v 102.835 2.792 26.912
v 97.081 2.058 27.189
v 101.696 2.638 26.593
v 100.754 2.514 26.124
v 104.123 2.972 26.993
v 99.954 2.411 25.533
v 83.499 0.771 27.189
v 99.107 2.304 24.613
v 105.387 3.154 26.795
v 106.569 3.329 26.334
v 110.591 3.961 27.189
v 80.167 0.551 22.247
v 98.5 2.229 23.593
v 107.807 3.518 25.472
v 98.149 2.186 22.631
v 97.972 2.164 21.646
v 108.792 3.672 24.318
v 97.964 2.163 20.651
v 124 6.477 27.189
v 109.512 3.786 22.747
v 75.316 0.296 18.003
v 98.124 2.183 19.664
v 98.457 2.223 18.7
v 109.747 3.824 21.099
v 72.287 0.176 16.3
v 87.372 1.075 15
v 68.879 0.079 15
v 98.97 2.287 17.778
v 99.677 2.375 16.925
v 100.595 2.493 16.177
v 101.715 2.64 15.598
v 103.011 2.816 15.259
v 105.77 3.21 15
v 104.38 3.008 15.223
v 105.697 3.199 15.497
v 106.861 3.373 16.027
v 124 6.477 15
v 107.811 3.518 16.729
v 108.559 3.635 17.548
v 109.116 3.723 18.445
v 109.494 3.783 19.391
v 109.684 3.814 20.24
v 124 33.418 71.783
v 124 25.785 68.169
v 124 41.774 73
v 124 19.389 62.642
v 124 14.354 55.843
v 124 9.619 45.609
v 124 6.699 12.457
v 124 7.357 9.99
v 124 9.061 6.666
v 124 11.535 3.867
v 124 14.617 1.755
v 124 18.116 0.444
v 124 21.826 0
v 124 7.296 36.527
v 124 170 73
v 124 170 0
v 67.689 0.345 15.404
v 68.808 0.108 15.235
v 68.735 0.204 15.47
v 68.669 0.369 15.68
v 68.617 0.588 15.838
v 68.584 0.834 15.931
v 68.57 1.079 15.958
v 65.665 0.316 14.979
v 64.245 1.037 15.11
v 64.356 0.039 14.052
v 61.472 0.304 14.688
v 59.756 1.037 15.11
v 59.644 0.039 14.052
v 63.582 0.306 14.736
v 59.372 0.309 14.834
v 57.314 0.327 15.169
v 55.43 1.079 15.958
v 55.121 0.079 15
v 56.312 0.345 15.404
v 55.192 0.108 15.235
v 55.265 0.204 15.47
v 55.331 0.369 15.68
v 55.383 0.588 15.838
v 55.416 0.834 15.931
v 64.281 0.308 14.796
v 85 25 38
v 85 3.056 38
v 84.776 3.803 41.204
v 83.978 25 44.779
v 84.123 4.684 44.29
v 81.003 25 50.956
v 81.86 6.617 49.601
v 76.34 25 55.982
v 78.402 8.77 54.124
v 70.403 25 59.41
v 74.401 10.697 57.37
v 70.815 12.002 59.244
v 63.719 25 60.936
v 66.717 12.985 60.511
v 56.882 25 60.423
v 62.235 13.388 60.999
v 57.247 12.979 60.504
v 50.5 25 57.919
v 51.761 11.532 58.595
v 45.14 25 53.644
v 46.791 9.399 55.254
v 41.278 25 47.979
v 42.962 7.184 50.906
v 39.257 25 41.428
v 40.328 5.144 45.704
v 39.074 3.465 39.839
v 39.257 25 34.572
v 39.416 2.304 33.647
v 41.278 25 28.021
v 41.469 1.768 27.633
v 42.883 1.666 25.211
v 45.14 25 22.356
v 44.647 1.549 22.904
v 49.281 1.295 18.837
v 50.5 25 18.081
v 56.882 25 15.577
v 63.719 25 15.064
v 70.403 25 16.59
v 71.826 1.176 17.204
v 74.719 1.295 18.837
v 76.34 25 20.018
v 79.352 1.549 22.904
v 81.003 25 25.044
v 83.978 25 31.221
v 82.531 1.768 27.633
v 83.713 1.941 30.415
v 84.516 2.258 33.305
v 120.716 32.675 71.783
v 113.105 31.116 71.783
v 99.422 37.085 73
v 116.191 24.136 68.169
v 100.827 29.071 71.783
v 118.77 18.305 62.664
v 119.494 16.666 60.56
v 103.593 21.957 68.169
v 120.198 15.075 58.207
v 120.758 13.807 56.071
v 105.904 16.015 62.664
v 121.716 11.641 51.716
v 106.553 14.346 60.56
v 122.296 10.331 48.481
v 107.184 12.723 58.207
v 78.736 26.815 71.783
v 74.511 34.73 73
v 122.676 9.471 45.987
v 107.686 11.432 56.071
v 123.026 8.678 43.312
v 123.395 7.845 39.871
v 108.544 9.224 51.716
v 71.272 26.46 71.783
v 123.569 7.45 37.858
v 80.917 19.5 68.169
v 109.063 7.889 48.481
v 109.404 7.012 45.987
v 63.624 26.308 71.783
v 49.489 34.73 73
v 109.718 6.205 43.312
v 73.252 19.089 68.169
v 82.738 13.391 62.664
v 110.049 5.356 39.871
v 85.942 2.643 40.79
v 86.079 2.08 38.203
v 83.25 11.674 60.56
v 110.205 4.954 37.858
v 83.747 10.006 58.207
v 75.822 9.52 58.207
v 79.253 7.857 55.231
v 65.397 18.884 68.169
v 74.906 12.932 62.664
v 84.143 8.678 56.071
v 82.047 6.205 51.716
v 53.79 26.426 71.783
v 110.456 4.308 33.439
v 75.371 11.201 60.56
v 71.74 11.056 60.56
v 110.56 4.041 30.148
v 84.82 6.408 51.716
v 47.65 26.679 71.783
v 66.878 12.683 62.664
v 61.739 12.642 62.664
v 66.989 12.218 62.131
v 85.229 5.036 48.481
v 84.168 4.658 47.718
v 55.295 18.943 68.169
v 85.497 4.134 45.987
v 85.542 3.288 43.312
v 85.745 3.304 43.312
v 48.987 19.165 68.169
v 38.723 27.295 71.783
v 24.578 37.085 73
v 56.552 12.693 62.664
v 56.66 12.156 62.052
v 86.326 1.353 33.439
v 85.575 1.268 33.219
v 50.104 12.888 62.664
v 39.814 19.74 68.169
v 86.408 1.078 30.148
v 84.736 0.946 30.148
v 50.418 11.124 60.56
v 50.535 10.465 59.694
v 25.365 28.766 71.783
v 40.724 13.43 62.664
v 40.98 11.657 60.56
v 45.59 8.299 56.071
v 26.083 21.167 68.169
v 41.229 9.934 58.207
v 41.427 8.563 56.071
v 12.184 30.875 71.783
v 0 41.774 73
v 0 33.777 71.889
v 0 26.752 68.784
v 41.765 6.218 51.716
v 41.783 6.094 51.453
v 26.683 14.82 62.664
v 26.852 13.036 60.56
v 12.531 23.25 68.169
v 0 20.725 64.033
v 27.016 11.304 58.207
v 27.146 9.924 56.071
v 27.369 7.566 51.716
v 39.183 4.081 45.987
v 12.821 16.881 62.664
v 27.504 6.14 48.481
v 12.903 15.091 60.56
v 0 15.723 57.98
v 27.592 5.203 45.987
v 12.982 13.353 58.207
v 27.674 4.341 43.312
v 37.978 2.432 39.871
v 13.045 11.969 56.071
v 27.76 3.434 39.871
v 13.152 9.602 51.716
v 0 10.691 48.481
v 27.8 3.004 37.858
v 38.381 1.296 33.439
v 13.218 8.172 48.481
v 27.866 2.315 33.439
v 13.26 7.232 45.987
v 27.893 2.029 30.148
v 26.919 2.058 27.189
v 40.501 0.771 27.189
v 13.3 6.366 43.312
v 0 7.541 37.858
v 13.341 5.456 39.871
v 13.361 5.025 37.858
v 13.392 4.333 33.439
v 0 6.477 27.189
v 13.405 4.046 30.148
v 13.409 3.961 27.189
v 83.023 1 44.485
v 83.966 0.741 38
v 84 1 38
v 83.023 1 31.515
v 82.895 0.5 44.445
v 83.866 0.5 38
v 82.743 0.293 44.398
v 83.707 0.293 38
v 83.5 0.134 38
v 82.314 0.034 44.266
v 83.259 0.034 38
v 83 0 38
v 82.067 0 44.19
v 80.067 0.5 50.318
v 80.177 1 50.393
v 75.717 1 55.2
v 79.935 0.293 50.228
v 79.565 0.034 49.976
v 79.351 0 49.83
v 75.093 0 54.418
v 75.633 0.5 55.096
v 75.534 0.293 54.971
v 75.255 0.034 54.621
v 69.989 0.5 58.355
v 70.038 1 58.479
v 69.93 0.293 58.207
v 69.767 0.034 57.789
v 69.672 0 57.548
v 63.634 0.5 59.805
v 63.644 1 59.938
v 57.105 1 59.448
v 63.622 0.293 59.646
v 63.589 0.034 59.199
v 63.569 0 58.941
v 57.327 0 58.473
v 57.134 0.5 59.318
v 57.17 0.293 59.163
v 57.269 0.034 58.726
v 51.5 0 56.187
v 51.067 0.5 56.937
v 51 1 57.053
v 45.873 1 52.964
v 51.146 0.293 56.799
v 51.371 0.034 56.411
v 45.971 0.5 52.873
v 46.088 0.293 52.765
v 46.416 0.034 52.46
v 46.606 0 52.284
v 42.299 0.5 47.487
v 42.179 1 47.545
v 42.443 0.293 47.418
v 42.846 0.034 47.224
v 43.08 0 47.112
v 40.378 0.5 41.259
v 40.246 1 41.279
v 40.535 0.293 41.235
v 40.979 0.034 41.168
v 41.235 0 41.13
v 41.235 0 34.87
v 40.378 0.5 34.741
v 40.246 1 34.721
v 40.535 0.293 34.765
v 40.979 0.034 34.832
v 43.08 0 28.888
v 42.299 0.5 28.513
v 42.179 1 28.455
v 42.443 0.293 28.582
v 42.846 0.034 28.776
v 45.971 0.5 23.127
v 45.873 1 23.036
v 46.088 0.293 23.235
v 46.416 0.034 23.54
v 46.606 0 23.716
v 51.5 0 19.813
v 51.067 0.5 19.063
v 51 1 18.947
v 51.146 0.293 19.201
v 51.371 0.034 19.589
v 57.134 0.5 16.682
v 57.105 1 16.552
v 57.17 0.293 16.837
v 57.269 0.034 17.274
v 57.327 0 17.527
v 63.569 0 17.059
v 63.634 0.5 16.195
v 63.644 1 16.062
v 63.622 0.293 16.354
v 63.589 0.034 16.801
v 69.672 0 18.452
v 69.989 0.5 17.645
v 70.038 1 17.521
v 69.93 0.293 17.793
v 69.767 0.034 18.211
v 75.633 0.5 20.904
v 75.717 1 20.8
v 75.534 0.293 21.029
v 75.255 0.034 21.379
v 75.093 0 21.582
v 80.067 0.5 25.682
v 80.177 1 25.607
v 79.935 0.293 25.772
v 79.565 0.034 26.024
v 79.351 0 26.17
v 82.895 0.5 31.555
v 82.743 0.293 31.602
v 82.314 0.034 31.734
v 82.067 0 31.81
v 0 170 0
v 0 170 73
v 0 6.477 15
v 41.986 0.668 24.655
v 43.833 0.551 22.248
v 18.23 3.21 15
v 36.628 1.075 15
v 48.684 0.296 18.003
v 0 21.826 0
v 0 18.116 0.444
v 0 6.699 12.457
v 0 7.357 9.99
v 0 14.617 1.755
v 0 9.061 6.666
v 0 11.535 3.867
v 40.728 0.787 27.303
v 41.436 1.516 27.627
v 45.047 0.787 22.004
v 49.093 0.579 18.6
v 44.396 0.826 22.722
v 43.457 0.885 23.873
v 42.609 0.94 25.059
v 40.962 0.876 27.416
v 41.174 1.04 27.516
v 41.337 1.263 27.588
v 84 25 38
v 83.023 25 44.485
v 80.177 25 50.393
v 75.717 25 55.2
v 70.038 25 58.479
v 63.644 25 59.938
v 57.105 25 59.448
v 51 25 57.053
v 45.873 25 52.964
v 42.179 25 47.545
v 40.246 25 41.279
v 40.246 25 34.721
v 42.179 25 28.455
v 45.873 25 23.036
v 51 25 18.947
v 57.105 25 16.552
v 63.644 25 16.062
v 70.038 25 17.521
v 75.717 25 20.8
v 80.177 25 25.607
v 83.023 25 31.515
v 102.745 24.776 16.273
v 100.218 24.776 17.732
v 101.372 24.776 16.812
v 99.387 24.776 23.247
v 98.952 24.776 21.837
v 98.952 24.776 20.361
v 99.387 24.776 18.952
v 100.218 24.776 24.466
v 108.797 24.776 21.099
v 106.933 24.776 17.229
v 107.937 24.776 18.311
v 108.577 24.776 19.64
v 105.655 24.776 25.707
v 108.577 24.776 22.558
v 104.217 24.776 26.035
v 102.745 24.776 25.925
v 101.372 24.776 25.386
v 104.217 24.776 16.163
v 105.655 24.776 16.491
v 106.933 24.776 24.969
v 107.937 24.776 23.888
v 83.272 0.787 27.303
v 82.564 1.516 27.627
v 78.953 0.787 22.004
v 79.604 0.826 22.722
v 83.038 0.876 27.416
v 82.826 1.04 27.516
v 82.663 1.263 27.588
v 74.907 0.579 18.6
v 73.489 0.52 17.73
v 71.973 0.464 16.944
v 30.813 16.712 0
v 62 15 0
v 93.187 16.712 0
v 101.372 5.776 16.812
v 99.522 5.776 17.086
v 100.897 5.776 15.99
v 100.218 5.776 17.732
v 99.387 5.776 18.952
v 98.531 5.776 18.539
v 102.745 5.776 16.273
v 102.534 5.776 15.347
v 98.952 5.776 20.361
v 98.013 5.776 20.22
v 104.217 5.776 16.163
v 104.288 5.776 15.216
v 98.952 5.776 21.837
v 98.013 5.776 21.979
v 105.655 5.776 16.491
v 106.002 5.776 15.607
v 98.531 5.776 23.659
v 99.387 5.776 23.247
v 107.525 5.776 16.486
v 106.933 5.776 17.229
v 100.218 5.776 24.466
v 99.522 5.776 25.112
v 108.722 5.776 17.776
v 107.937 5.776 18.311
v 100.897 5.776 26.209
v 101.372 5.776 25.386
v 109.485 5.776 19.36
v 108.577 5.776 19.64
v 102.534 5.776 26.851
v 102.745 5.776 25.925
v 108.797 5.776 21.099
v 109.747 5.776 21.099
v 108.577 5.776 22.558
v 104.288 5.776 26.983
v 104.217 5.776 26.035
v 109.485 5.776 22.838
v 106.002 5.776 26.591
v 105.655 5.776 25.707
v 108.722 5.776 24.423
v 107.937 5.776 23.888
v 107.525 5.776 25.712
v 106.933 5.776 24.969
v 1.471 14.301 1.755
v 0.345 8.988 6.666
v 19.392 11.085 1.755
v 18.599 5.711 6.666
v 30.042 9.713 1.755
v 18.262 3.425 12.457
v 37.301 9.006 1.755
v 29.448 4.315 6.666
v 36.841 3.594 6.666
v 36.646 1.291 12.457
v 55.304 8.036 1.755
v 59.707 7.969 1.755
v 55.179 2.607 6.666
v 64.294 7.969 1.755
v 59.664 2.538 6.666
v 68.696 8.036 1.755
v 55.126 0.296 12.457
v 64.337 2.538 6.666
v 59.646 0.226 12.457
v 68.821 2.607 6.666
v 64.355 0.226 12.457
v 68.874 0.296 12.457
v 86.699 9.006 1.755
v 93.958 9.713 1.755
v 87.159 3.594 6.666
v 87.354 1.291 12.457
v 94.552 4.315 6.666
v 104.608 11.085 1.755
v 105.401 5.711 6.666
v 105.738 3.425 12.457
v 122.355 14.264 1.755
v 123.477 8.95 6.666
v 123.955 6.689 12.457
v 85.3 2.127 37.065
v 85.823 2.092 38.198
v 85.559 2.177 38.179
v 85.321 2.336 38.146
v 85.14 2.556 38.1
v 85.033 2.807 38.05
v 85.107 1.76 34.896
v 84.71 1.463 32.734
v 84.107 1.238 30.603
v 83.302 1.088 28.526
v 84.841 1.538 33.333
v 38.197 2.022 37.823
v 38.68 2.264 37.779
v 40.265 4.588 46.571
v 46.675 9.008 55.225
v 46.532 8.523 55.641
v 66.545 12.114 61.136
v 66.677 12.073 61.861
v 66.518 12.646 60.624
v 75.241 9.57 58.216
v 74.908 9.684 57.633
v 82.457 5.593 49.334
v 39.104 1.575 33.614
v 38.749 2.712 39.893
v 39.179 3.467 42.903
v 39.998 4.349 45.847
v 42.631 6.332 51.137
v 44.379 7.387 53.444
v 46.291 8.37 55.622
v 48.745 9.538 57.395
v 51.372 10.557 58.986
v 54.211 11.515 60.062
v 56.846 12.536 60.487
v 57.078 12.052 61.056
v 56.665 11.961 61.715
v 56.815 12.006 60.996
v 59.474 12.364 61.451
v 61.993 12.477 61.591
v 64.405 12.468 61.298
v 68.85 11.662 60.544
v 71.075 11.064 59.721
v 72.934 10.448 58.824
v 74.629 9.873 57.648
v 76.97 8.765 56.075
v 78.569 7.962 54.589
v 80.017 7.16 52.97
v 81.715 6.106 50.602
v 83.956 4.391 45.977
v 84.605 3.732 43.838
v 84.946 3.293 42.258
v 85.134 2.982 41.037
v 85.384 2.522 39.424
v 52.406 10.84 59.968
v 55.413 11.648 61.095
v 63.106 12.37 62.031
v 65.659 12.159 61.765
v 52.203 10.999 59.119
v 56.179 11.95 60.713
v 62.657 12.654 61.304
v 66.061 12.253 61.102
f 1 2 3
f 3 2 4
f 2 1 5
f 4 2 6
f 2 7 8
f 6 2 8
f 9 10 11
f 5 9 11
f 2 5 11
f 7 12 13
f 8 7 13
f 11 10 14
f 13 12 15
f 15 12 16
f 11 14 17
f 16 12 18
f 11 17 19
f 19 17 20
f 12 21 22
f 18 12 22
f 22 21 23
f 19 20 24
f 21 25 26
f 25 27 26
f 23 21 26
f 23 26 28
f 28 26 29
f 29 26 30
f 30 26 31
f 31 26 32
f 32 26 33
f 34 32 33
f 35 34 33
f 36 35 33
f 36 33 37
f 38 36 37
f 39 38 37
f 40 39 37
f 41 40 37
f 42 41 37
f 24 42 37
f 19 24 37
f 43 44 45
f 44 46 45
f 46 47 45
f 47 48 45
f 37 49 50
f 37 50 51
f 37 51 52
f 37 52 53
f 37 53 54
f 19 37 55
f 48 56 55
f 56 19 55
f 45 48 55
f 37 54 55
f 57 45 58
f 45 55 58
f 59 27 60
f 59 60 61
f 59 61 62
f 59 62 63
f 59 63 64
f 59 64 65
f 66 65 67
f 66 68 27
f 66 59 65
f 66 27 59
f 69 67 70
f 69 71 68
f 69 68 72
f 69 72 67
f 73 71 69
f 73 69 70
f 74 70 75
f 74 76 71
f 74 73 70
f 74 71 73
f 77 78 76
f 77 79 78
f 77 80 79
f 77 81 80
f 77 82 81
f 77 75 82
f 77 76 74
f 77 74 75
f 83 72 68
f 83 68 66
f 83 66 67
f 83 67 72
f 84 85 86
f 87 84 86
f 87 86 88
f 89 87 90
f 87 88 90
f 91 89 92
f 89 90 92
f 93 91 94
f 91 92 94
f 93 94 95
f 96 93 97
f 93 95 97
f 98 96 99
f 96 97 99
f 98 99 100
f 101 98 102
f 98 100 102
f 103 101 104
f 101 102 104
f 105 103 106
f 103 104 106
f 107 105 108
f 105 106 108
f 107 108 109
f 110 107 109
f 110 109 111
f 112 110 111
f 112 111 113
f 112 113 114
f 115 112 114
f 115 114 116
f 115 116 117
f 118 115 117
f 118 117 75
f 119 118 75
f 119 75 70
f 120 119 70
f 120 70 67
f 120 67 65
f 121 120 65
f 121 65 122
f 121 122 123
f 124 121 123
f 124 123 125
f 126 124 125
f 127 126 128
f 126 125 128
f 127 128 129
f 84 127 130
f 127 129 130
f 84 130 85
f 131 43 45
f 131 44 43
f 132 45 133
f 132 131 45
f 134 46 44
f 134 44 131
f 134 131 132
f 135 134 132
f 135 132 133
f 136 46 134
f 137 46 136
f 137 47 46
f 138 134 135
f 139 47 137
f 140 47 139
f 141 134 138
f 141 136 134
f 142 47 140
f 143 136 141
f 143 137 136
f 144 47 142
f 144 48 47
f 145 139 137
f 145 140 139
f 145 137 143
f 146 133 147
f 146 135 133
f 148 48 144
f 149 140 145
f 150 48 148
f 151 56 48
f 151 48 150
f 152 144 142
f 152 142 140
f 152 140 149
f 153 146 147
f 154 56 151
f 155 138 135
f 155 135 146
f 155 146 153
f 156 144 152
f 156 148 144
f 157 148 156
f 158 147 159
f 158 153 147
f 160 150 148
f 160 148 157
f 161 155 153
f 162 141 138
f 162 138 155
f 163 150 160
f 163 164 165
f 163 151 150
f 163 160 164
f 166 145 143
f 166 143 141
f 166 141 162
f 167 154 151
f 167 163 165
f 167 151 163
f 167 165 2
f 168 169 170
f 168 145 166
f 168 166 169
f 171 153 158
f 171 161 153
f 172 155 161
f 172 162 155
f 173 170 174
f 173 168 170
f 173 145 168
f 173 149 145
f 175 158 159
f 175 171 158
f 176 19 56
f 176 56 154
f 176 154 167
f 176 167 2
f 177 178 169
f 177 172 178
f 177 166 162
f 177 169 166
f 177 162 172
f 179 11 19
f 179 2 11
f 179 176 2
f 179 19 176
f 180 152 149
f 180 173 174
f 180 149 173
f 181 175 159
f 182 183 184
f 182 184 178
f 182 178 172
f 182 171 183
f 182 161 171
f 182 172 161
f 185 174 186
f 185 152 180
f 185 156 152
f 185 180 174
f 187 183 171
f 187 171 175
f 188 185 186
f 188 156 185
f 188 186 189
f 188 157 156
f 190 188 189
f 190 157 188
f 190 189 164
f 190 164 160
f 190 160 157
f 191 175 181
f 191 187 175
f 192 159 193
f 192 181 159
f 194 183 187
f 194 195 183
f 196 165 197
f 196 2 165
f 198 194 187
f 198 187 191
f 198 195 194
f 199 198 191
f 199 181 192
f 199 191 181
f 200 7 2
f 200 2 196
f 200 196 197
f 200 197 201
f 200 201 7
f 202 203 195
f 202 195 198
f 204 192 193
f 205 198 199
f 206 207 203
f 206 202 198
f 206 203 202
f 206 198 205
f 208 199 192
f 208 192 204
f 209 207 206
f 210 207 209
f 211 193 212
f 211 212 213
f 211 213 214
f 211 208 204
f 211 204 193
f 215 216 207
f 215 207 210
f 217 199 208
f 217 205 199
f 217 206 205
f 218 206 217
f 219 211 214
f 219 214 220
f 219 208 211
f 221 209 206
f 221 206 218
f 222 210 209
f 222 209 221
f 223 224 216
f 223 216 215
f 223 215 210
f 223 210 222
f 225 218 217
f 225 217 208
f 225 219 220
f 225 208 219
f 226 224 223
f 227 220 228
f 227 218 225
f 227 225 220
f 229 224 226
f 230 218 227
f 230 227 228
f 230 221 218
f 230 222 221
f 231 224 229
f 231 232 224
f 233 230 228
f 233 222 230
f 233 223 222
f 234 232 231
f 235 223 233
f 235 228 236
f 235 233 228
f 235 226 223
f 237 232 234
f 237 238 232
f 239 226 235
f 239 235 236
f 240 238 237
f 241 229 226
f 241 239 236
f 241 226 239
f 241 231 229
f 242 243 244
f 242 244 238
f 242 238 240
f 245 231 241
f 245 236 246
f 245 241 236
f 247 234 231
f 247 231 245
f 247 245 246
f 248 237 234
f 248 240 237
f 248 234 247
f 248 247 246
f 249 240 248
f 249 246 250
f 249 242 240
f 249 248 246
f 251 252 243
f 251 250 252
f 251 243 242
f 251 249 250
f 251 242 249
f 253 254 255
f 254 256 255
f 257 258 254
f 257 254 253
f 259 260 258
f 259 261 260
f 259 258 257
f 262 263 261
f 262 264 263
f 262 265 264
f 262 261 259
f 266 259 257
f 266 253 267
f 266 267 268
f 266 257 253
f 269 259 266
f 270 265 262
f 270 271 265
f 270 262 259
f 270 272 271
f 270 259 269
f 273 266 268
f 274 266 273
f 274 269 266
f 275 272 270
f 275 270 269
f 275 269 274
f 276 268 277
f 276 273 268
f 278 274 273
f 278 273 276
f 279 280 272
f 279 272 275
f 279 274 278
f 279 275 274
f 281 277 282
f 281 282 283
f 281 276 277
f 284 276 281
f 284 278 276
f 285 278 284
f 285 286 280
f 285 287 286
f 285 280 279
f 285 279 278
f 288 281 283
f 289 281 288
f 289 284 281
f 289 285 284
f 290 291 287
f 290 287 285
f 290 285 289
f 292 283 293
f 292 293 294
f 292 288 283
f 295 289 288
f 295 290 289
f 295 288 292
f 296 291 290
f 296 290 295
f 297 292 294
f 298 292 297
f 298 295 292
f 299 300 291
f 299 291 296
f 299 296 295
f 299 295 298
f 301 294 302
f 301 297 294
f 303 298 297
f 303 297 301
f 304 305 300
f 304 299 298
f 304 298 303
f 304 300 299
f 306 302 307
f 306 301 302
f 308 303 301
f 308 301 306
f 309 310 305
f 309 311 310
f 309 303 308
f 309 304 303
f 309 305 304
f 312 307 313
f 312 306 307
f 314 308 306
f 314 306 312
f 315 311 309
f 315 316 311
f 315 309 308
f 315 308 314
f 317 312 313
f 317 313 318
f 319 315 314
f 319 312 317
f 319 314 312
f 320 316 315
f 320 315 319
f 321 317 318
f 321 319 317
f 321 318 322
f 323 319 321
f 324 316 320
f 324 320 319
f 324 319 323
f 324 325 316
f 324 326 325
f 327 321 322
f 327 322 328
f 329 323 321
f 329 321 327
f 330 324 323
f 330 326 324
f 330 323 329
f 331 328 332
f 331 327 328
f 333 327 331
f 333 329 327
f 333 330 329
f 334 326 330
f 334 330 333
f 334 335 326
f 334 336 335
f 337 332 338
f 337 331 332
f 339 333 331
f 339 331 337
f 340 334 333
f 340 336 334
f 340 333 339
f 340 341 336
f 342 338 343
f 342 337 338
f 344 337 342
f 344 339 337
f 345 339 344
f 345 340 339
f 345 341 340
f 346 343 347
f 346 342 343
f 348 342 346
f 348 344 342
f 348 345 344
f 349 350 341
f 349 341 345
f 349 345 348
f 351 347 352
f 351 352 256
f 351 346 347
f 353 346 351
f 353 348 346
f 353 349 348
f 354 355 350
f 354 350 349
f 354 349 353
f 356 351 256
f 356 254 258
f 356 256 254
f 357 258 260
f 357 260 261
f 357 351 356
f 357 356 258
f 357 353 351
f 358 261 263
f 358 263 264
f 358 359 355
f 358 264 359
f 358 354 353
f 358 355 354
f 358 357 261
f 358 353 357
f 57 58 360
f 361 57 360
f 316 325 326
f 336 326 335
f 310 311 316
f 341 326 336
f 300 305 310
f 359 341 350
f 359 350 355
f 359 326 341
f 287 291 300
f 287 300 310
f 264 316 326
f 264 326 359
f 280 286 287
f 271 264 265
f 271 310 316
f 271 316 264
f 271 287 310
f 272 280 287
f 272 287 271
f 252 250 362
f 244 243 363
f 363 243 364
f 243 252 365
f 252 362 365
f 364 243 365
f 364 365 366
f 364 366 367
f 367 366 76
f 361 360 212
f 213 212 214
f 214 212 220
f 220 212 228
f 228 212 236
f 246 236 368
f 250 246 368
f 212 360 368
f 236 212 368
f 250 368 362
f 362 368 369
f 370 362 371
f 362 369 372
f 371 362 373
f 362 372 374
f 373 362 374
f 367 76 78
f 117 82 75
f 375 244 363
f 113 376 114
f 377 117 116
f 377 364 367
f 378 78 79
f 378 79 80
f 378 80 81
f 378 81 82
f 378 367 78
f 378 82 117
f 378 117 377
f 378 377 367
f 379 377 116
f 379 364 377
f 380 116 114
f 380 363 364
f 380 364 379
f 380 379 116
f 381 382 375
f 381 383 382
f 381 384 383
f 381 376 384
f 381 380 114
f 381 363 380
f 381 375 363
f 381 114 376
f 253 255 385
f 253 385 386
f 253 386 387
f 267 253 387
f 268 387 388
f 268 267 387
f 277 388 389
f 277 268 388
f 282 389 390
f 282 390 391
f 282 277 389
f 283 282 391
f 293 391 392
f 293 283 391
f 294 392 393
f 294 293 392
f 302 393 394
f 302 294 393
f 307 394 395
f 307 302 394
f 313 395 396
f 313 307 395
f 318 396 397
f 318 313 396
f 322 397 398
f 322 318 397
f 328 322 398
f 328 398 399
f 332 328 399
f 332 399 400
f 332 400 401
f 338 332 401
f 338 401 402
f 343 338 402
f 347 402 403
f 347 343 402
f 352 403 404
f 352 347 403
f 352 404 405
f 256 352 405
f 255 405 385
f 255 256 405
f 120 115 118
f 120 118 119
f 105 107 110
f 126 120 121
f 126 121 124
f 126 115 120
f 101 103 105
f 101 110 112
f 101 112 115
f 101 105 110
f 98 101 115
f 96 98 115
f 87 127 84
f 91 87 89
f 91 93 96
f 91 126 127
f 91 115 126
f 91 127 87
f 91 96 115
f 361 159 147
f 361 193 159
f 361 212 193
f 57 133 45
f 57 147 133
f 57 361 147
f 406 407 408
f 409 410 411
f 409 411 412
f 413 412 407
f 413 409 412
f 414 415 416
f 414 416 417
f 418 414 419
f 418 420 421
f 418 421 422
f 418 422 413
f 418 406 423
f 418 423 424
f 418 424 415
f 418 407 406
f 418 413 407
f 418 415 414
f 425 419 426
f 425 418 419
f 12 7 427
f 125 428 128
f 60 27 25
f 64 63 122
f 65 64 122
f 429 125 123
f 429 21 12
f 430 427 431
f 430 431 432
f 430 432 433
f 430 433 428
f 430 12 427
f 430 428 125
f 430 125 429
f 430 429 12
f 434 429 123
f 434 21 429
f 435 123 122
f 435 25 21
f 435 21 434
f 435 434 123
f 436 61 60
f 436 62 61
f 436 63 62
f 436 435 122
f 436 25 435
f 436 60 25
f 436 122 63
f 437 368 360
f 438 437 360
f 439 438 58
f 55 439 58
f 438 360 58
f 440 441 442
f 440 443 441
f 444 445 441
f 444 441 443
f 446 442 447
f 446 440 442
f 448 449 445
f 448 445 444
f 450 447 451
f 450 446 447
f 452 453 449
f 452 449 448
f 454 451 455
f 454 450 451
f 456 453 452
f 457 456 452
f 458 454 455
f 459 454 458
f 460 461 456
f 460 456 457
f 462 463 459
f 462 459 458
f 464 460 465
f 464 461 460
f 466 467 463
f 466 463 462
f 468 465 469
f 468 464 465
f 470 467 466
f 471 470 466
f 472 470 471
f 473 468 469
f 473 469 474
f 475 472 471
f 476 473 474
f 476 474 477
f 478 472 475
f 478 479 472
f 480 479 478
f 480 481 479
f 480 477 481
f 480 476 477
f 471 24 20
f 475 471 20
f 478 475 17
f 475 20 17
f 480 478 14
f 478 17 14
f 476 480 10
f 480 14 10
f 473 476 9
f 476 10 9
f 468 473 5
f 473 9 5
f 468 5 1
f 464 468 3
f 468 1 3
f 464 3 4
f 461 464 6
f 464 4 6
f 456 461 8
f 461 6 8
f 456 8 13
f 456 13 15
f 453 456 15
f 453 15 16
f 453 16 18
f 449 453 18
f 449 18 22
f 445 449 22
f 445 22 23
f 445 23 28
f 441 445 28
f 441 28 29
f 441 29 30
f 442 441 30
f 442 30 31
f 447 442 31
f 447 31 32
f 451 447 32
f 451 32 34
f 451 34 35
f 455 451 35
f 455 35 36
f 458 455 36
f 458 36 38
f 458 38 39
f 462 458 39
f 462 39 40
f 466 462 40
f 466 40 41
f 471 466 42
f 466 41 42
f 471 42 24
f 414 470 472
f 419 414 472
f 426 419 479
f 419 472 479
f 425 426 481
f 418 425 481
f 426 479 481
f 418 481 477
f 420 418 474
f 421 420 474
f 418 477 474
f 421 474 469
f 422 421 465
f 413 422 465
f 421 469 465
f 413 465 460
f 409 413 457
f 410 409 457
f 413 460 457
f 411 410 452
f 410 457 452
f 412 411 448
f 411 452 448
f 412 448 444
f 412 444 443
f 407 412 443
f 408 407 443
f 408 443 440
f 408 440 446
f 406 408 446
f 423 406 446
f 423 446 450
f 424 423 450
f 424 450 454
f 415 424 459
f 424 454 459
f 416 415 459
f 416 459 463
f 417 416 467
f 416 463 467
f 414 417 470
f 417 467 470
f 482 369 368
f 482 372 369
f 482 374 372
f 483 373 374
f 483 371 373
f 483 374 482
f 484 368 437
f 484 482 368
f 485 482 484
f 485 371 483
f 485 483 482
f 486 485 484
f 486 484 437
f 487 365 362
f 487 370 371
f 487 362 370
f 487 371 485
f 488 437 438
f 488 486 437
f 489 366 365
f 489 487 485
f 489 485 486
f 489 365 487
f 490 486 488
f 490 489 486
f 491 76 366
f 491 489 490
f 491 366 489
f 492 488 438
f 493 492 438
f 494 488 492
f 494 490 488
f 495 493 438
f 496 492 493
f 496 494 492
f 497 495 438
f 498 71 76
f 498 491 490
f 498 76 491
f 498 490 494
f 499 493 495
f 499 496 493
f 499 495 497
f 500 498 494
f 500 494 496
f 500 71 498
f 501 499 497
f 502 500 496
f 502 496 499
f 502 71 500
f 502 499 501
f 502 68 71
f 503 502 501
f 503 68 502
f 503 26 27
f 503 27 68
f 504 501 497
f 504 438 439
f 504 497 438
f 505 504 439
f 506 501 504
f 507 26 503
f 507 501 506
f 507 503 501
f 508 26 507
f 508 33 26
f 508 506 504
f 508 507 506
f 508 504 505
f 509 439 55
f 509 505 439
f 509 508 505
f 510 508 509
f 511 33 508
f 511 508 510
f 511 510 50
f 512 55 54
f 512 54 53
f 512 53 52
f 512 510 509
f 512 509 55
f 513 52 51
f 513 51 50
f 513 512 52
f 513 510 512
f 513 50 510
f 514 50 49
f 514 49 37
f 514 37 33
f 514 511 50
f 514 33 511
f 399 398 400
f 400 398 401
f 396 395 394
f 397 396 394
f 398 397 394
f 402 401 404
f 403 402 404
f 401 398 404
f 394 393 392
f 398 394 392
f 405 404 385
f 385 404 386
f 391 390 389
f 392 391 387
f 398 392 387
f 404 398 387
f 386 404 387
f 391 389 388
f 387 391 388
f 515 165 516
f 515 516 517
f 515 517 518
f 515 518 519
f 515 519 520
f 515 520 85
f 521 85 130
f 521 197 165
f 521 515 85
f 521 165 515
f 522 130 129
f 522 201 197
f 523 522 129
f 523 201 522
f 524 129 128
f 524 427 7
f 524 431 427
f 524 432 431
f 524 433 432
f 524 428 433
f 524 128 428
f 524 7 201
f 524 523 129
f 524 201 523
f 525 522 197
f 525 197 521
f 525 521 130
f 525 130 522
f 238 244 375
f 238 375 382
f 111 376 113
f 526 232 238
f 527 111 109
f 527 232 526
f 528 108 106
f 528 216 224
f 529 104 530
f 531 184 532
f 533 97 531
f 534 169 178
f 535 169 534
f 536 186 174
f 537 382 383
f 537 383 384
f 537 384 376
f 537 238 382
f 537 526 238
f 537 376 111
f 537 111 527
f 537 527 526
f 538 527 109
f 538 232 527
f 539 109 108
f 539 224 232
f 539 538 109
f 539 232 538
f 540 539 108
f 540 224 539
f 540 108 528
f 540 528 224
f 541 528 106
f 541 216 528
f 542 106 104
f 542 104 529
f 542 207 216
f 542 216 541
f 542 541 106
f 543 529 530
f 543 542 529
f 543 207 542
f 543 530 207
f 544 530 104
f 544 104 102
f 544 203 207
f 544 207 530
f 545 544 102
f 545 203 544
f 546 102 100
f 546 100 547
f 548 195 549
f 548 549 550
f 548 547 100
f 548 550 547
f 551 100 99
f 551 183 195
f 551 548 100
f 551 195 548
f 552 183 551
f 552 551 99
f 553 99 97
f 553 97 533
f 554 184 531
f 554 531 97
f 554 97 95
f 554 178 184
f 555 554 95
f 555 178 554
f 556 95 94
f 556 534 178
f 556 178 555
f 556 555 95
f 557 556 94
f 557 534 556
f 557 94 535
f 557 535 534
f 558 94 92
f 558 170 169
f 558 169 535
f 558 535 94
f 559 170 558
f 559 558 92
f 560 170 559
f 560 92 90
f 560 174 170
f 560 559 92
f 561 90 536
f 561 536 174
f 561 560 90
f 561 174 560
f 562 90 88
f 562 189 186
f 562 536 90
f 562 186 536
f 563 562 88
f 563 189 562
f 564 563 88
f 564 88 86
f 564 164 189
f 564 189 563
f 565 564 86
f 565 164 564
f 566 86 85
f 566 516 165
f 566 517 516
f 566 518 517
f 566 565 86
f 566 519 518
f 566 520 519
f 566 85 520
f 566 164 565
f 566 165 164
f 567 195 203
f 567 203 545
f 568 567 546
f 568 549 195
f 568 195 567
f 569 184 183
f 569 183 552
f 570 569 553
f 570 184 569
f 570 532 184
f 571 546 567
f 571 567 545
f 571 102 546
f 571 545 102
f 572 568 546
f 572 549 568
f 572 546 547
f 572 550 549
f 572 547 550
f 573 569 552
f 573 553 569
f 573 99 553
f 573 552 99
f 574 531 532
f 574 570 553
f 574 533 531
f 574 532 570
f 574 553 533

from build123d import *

# Parameters (mm, degrees)
F1_DEPTH  = 73
F4_R      = 15
F5_R      = 23
F6_DEPTH  = 25
F7_R      = 1
F8_R      = 22
F9_DEPTH  = 25
F10_R     = 1
F11_R     = 5.9
F12_DEPTH = 5.776
F13_R     = 4.95
F14_DEPTH = 19


with BuildPart() as f1:
    # F0 (on Top) → F1 (new body)
    with BuildSketch(Plane.XY):
        with BuildLine():
            Line((124, 170), (0, 170))
            Line((0, 170), (0, 6.4765767439))
            ThreePointArc((0, 6.4765767439), (62, 0), (124, 6.4765767439))
            Line((124, 6.4765767439), (124, 170))
        make_face()
    extrude(amount=F1_DEPTH)

    # F2 (on face) → F3 (revolve, cut)
    with BuildSketch(Plane(origin=(0, 0, 0), x_dir=(0, -1, 0), z_dir=(-1, 0, 0))):
        with BuildLine():
            Line((4.2734915467, 0), (4.2734915467, 73))
            Line((4.2734915467, 73), (-41.7740754783, 73))
            add(Edge.make_bspline(
                [(-41.7740754783, 73), (-19.0017276995, 73), (-6.4765767439, 47.6772180576), (-6.4765767439, 27.189235397)],
                knots=[0, 0, 0, 0, 0.5570327747, 0.5570327747, 0.5570327747, 0.5570327747], degree=3))
            Line((-6.4765767439, 27.189235397), (-6.4765767439, 0))
            Line((-6.4765767439, 0), (4.2734915467, 0))
        make_face()
    revolve(axis=Axis((62, 300, 0), (0, 0, -1)), mode=Mode.SUBTRACT)

    # F4
    f4_edges = [f1.edges().sort_by_distance(p)[0] for p in [
        (62, 0, 0),
    ]]
    fillet(f4_edges, radius=F4_R)

    # F5 (on Front) → F6 (cut)
    with BuildSketch(Plane.XZ):
        with Locations((62, 38)):
            Circle(F5_R)
    extrude(amount=-F6_DEPTH, mode=Mode.SUBTRACT)

    # F7
    f7_edges = [f1.edges().sort_by_distance(p)[0] for p in [
        (84.321276, 1.092016, 32.453774),
        (56.414529, 10.754814, 60.311488),
    ]]
    fillet(f7_edges, radius=F7_R)

    # F11 (on Front) → F12 (cut)
    with BuildSketch(Plane.XZ):
        with Locations((103.8468026996, 21.099235397)):
            Circle(F11_R)
    extrude(amount=-F12_DEPTH, mode=Mode.SUBTRACT)

    # F13 (on face) → F14 (cut)
    with BuildSketch(Plane.XZ.offset(-5.776)):
        with Locations((103.8468026996, 21.099235397)):
            Circle(F13_R)
    extrude(amount=-F14_DEPTH, mode=Mode.SUBTRACT)


with BuildPart() as f9:
    # F8 (on Front) → F9 (new body)
    with BuildSketch(Plane.XZ):
        with Locations((62, 38)):
            Circle(F8_R)
    extrude(amount=-F9_DEPTH)

    # F10
    f10_edges = [f9.edges().sort_by_distance(p)[0] for p in [
        (40, 0, 38),
    ]]
    fillet(f10_edges, radius=F10_R)


solid = Compound([f1.part, f9.part])
